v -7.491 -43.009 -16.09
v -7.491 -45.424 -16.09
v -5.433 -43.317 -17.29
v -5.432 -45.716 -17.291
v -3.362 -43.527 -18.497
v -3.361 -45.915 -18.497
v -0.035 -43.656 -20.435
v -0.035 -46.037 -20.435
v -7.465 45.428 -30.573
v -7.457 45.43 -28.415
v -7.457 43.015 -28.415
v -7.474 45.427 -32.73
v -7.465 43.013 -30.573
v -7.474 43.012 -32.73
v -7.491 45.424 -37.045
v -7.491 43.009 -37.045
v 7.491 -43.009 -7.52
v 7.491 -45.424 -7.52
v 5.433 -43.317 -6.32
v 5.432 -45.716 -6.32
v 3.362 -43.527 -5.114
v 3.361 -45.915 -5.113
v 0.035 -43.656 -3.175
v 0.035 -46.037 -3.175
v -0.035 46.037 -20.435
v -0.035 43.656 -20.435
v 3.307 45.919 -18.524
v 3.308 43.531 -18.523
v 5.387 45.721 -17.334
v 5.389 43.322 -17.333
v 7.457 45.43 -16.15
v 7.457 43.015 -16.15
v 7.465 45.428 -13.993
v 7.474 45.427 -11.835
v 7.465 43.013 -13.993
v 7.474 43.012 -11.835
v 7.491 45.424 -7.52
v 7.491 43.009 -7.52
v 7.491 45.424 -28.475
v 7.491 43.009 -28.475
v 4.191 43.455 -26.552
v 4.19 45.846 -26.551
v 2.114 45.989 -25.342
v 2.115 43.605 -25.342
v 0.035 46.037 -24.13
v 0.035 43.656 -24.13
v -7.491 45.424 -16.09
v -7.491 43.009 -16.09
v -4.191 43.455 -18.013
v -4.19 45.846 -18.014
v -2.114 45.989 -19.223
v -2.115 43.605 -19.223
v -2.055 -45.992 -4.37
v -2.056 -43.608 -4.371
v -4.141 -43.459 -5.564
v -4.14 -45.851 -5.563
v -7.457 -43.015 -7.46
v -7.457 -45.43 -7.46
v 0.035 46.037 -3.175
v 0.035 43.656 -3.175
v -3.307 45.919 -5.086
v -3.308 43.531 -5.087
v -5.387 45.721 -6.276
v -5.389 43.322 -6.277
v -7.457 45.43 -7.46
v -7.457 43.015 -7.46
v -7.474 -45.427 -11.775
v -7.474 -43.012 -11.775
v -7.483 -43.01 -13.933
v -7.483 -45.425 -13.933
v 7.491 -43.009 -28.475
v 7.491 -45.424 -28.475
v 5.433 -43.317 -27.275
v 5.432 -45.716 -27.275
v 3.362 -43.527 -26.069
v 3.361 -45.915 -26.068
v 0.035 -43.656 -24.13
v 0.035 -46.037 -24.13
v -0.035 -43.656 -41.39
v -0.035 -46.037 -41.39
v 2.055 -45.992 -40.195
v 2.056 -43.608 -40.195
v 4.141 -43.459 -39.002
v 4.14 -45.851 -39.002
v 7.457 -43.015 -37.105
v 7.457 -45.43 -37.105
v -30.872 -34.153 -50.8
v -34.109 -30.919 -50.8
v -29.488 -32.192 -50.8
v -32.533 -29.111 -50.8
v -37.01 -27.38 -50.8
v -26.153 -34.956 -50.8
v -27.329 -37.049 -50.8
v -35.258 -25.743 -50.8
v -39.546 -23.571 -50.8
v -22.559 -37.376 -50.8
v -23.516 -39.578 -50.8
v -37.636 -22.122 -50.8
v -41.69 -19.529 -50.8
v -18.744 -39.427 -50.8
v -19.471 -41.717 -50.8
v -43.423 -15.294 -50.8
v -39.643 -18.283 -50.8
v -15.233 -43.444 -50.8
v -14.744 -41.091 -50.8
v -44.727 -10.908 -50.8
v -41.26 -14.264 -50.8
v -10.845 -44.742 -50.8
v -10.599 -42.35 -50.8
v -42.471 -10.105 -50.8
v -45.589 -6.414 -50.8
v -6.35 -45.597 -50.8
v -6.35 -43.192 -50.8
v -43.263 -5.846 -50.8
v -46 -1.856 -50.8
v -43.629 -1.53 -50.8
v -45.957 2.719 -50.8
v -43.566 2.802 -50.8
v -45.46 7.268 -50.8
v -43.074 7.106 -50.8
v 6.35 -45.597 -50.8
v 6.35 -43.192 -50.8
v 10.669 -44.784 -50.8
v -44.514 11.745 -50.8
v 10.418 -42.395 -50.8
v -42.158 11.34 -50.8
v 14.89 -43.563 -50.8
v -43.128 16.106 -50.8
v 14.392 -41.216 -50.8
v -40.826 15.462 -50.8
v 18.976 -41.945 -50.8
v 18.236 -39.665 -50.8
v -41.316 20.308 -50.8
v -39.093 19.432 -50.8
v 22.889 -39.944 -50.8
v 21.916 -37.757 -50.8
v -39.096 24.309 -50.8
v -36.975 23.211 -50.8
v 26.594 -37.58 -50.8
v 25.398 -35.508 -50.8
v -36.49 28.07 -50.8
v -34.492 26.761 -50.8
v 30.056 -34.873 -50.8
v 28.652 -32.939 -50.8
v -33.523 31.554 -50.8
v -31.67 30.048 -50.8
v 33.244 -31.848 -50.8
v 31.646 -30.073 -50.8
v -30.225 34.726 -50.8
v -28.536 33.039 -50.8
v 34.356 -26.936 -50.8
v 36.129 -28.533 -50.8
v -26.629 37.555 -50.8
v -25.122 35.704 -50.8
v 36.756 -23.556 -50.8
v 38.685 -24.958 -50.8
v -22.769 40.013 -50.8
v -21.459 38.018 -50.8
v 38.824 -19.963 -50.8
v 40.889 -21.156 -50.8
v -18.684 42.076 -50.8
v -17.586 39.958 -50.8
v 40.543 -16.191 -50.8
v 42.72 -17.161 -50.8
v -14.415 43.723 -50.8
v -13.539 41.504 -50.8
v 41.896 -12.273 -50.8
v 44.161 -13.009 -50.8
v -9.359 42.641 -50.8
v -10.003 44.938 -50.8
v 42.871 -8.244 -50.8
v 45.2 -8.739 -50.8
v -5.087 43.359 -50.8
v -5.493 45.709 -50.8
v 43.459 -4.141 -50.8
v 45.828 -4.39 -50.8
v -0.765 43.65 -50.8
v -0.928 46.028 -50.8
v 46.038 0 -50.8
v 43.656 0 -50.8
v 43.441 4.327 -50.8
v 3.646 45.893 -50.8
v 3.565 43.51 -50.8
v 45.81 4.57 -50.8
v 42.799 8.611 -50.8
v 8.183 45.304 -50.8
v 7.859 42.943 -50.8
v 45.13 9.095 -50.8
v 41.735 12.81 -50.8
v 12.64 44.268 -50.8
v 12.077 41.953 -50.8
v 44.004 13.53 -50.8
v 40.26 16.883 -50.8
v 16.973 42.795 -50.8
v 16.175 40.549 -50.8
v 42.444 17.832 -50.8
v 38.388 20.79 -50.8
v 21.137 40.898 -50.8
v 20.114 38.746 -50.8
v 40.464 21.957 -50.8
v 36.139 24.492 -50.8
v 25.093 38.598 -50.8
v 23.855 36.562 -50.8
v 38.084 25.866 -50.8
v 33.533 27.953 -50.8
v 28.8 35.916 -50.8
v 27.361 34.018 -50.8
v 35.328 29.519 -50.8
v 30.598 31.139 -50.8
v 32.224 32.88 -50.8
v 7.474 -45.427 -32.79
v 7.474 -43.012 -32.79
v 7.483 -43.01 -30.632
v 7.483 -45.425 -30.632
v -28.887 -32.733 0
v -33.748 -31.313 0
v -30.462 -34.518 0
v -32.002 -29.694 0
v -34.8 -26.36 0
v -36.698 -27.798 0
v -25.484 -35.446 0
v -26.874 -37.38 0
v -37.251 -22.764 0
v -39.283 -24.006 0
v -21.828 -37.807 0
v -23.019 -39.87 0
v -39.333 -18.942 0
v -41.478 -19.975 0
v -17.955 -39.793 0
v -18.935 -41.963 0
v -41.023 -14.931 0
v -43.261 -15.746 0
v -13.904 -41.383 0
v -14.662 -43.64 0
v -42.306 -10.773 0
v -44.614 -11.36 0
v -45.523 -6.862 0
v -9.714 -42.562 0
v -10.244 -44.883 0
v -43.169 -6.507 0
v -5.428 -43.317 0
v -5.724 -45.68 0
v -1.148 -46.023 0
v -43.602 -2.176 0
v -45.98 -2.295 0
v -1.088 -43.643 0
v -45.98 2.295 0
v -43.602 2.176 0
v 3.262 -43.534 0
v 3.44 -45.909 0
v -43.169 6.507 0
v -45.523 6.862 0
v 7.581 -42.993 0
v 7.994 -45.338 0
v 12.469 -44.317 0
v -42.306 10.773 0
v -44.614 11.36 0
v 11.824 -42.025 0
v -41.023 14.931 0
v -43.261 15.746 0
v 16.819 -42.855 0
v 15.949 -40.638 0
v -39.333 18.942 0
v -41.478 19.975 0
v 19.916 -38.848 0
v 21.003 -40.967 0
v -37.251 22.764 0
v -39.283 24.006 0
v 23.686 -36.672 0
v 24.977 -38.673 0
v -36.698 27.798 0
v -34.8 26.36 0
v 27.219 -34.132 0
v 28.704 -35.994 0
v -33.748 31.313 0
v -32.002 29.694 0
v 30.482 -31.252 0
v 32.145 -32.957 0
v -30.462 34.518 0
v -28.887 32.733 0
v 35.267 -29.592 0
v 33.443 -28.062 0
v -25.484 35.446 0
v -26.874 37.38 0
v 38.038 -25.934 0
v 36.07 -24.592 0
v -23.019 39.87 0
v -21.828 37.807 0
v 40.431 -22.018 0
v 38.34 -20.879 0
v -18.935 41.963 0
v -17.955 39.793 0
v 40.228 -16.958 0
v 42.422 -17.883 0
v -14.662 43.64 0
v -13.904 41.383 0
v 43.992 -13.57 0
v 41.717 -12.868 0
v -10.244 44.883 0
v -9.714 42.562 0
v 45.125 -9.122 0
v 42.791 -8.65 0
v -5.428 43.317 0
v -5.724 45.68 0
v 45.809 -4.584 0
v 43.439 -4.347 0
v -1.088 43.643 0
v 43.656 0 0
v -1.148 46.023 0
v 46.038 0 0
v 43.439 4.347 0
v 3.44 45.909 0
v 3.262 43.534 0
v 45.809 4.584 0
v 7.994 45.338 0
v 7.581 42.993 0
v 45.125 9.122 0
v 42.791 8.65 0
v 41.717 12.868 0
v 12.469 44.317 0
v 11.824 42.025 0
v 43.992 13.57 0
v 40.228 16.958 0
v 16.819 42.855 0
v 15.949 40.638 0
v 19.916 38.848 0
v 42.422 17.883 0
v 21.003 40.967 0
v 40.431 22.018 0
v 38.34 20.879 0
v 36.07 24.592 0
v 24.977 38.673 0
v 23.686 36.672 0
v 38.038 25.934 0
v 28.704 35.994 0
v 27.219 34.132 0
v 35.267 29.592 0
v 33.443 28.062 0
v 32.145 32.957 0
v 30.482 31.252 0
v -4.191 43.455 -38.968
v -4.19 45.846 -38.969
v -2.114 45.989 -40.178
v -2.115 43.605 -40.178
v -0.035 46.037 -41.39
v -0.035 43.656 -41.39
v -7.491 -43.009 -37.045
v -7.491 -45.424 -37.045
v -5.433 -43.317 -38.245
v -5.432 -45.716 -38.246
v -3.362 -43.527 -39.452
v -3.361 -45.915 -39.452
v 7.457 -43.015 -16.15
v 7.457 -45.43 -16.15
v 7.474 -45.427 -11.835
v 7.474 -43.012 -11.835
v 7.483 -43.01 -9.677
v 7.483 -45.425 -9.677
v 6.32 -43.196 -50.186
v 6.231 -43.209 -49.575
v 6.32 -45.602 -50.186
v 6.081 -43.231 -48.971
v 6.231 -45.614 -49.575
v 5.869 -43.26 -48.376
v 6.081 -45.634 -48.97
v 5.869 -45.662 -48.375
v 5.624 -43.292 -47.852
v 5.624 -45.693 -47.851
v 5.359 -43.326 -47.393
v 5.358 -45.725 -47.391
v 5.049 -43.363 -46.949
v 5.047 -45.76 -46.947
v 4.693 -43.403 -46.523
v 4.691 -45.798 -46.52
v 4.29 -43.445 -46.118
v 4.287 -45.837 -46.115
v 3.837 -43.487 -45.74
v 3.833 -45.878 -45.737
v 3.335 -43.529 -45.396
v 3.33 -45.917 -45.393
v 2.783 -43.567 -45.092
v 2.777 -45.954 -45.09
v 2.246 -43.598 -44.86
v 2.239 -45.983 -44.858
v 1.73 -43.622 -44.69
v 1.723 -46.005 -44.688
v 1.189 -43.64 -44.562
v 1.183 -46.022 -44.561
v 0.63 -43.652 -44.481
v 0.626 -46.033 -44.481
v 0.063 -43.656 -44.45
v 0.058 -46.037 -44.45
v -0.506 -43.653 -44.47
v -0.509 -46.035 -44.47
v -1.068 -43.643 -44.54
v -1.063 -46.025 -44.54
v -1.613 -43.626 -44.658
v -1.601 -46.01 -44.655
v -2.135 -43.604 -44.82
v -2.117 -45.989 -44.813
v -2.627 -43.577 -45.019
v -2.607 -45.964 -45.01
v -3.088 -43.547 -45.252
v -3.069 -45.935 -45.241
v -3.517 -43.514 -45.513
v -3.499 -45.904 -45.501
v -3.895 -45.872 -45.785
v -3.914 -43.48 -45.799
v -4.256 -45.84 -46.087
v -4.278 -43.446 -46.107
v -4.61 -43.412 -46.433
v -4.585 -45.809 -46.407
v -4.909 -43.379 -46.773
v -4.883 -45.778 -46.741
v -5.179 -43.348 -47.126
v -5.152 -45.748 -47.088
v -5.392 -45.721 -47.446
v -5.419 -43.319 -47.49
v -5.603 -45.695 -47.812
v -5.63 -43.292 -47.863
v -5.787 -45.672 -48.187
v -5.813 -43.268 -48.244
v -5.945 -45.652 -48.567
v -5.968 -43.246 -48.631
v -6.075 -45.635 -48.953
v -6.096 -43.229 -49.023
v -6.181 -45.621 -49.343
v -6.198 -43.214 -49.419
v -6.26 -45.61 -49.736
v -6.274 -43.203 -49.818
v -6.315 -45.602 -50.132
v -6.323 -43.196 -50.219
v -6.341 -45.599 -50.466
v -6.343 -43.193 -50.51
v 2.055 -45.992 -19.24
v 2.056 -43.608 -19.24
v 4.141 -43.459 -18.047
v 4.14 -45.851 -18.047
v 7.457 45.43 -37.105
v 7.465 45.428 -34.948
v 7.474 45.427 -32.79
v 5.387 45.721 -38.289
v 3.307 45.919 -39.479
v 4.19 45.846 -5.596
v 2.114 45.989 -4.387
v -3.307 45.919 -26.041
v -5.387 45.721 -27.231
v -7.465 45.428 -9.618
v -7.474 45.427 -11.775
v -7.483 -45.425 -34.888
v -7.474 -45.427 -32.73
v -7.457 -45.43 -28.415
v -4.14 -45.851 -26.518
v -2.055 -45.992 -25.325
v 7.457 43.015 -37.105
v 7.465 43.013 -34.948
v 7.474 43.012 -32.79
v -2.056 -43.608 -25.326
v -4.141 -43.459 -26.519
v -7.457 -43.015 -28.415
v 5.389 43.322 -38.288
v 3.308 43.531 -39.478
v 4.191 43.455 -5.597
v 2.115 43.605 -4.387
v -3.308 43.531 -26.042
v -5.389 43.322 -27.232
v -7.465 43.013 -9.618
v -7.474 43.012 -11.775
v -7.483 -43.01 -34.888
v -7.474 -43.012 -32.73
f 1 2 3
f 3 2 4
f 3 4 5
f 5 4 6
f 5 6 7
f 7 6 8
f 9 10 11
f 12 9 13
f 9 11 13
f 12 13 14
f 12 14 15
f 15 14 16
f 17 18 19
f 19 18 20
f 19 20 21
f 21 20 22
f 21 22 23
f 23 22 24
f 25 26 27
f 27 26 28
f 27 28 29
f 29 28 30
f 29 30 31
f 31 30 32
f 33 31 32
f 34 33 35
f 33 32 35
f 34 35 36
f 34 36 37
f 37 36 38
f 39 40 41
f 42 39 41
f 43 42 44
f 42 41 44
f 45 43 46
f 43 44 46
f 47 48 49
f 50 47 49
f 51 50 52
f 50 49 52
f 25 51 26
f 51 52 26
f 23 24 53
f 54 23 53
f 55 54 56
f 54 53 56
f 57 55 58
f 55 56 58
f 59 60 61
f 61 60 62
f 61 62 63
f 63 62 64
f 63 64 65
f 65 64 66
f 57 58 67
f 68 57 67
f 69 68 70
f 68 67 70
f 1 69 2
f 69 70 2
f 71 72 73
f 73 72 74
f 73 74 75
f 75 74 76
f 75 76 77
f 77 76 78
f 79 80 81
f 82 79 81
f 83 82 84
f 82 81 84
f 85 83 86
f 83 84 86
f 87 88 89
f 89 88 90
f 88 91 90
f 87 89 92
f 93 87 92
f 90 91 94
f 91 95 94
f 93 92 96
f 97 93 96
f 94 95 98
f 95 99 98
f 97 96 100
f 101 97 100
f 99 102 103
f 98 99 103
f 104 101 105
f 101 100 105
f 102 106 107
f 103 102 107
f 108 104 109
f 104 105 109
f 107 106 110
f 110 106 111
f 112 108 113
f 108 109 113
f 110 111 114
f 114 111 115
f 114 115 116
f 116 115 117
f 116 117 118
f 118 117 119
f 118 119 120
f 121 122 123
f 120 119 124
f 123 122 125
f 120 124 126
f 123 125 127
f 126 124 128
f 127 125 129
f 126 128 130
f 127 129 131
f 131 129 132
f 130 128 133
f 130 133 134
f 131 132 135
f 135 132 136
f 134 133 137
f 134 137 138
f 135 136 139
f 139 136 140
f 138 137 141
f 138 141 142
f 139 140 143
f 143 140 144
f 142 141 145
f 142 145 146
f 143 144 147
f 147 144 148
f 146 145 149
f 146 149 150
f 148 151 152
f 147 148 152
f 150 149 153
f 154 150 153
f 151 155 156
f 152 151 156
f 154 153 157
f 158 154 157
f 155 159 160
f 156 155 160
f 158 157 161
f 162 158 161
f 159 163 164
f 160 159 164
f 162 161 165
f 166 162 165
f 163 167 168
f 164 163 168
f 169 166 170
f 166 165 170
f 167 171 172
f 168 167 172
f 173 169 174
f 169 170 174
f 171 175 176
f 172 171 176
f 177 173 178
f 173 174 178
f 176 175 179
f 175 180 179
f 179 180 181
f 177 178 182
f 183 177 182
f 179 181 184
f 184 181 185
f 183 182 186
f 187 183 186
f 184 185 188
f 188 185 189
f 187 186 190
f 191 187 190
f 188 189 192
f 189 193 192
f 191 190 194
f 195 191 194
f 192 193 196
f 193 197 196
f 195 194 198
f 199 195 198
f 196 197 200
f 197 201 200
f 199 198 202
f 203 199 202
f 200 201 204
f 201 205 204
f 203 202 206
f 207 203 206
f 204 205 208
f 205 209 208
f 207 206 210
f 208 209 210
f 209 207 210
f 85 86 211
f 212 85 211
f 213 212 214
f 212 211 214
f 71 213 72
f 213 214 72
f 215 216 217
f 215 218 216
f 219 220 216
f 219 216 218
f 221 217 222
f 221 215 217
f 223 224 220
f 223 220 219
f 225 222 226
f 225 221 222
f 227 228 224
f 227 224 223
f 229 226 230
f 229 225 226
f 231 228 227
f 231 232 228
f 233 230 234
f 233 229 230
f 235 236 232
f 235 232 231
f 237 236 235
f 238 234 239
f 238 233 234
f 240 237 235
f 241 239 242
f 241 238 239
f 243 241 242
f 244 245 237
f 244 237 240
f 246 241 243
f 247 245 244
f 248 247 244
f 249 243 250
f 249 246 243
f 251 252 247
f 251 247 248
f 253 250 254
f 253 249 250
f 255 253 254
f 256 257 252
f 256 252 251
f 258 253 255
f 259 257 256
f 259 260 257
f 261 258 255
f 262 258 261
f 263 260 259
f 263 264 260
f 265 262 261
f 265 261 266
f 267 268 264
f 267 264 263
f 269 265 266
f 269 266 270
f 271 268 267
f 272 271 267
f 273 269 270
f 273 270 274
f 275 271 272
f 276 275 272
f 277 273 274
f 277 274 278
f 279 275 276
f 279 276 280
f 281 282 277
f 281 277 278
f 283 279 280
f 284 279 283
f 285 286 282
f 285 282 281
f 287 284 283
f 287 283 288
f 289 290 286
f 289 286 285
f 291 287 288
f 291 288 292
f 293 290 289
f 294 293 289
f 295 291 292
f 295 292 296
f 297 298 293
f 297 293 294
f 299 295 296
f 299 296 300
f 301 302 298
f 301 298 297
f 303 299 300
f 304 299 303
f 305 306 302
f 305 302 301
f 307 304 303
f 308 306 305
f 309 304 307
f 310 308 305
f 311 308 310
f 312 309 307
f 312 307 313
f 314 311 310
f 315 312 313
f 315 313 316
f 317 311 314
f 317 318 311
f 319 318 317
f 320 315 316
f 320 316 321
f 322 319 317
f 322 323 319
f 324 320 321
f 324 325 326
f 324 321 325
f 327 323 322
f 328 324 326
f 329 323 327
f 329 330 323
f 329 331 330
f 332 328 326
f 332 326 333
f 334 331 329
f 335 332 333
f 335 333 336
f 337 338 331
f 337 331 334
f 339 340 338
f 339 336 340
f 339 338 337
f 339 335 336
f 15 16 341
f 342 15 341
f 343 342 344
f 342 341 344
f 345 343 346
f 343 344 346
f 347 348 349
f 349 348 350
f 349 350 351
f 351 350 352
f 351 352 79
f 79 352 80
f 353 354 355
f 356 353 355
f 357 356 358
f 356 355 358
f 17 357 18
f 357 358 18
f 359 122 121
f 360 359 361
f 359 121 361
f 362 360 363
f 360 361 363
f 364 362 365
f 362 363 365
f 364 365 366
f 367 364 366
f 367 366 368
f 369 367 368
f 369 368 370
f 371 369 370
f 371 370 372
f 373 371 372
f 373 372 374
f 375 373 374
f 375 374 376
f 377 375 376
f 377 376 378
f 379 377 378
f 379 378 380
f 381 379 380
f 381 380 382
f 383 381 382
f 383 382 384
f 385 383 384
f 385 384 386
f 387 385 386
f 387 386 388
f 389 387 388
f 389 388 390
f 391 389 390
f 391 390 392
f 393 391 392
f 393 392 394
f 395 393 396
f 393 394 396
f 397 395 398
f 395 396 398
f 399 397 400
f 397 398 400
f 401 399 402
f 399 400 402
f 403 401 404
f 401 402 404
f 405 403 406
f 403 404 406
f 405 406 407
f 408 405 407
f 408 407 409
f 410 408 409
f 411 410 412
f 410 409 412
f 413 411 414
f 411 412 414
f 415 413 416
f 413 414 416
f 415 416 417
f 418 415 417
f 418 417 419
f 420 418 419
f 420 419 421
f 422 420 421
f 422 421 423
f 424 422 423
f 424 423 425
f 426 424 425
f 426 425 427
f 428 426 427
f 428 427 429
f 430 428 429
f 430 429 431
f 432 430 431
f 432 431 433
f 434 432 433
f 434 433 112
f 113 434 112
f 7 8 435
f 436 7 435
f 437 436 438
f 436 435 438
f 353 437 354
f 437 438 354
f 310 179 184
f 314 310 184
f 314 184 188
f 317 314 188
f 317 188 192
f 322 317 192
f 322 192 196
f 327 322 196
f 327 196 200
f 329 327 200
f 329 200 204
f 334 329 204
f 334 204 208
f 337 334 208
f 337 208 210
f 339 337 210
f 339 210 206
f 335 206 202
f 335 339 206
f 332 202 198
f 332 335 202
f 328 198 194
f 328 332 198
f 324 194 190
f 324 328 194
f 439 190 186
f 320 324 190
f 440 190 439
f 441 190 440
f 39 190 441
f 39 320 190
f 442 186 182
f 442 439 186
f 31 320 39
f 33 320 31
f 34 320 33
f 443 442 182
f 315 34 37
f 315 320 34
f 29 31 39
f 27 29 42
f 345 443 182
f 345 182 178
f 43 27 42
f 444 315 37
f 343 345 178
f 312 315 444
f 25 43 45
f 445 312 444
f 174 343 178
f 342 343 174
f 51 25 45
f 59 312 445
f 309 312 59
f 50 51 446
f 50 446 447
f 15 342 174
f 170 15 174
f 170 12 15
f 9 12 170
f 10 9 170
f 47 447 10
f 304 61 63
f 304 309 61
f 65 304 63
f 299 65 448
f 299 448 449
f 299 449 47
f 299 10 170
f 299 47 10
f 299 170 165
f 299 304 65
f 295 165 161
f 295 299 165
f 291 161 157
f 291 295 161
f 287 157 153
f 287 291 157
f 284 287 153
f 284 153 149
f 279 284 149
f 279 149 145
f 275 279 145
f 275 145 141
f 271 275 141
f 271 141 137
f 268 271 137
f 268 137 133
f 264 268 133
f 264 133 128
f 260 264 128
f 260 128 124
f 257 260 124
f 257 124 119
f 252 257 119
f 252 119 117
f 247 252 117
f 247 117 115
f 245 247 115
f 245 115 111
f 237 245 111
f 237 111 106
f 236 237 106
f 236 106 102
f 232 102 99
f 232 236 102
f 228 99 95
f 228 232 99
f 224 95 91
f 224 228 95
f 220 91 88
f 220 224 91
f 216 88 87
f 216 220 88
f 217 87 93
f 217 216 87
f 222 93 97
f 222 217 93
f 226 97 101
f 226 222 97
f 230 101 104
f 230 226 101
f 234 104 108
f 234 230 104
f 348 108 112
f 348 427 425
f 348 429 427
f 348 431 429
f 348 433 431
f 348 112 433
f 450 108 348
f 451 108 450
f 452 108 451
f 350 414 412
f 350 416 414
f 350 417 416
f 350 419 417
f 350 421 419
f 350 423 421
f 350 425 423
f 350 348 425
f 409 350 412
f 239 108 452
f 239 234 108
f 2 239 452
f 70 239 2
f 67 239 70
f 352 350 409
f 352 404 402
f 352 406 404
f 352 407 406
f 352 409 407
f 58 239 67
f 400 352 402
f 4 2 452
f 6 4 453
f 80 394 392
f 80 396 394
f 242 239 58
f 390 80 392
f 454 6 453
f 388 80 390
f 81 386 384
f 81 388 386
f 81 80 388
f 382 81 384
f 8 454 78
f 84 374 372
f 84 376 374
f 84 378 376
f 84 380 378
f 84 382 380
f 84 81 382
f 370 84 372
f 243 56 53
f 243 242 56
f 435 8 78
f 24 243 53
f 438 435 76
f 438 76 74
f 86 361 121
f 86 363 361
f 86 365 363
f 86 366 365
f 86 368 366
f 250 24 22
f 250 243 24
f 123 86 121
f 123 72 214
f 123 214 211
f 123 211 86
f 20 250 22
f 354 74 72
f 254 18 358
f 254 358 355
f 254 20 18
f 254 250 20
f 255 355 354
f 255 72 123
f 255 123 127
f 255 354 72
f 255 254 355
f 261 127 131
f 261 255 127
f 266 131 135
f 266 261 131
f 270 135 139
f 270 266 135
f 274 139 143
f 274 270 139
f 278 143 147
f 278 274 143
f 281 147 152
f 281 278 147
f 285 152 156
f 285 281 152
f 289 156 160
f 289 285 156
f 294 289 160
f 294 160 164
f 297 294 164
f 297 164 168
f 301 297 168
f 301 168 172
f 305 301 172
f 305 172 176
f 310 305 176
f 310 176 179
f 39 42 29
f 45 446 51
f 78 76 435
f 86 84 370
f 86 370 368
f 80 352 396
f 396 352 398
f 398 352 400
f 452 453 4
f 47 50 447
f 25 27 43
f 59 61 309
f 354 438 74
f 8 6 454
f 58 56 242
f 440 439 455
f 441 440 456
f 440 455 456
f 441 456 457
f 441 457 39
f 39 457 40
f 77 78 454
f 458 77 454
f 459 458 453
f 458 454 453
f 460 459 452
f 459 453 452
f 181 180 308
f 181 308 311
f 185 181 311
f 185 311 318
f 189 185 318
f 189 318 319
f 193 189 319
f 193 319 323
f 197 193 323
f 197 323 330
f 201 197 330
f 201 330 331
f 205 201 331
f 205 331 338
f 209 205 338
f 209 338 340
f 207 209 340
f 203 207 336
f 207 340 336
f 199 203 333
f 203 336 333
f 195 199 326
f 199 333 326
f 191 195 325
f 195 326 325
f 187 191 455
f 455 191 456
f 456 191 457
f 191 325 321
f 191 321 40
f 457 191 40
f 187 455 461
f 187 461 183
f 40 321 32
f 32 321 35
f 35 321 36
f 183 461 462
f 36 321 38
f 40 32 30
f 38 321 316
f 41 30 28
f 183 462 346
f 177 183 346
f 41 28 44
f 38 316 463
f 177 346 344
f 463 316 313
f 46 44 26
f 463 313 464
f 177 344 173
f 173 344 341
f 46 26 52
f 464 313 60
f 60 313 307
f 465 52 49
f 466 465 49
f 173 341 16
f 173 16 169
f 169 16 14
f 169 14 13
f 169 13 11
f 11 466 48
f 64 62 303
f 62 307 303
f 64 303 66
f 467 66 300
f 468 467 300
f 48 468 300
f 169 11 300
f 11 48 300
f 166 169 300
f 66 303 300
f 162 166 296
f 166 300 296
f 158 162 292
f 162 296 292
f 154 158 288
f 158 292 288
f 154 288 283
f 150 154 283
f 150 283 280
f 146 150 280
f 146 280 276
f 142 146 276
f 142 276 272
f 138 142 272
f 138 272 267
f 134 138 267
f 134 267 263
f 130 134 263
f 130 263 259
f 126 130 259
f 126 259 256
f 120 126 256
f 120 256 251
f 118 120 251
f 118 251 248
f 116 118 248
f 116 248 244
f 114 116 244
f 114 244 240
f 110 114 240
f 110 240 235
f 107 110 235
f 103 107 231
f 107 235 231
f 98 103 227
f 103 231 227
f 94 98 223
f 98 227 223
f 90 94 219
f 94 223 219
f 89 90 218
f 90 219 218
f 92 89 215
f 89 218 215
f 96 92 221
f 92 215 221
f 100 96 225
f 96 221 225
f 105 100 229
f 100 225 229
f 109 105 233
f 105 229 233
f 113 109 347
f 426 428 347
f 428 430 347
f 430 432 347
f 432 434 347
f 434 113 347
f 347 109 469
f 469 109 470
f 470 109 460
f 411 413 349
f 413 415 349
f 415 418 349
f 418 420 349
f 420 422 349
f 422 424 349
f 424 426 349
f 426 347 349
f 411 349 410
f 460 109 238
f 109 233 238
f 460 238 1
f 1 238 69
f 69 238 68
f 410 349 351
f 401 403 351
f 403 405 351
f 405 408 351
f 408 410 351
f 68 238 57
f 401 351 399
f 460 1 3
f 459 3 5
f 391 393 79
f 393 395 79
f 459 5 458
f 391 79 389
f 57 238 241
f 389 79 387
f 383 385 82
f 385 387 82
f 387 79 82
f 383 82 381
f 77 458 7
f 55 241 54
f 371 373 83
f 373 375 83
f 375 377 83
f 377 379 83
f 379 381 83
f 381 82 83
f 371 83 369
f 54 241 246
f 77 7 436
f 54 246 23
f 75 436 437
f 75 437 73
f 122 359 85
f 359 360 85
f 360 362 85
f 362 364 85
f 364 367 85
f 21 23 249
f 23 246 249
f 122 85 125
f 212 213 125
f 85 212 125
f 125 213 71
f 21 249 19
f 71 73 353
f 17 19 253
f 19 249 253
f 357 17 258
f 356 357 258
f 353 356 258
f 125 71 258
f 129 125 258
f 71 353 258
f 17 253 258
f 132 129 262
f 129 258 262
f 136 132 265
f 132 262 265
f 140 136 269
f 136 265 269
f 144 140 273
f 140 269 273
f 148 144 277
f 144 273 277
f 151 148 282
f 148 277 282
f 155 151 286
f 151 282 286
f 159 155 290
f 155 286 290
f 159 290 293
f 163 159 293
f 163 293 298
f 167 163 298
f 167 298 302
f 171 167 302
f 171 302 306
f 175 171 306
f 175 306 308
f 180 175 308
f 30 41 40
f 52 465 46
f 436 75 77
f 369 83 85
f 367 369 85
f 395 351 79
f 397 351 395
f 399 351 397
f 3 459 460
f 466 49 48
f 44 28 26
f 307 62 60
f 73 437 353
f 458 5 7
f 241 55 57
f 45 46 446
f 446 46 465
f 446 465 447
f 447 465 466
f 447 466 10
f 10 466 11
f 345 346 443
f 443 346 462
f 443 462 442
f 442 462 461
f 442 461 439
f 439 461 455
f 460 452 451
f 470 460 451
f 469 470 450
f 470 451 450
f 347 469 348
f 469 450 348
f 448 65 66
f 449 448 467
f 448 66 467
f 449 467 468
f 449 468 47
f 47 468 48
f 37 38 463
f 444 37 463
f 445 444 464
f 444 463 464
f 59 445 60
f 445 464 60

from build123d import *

# Parameters (mm, degrees)
F0_R     = 46.0375
F0_R_2   = 43.65625
F1_DEPTH = 50.8
F3_R     = 6.35
F4_DEPTH = 5.588
F6_DEPTH = 92.5205


with BuildPart() as f1:
    # F0 (on Top) → F1 (new body)
    with BuildSketch(Plane.XY):
        Circle(F0_R)
        Circle(F0_R_2, mode=Mode.SUBTRACT)
    extrude(amount=-F1_DEPTH)

    # F3 (on offset) → F4 (cut)
    with BuildSketch(Plane.XZ.offset(46.482)):
        with Locations((0, -50.8)):
            Circle(F3_R)
    extrude(amount=-F4_DEPTH, mode=Mode.SUBTRACT)

    # F5 (on offset) → F6 (cut, through all)
    with BuildSketch(Plane.XZ.offset(46.482)):
        Polygon((-0.034585, -20.435439), (7.456778, -16.150234), (7.491364, -7.51992), (0.034585, -3.174812), (-7.456778, -7.460017), (-7.491364, -16.090331), align=None)
        Polygon((7.456778, -37.105234), (7.491364, -28.47492), (0.034585, -24.129812), (-7.456778, -28.415017), (-7.491364, -37.045331), (-0.034585, -41.390439), align=None)
    extrude(amount=-F6_DEPTH, mode=Mode.SUBTRACT)


solid = f1.part
